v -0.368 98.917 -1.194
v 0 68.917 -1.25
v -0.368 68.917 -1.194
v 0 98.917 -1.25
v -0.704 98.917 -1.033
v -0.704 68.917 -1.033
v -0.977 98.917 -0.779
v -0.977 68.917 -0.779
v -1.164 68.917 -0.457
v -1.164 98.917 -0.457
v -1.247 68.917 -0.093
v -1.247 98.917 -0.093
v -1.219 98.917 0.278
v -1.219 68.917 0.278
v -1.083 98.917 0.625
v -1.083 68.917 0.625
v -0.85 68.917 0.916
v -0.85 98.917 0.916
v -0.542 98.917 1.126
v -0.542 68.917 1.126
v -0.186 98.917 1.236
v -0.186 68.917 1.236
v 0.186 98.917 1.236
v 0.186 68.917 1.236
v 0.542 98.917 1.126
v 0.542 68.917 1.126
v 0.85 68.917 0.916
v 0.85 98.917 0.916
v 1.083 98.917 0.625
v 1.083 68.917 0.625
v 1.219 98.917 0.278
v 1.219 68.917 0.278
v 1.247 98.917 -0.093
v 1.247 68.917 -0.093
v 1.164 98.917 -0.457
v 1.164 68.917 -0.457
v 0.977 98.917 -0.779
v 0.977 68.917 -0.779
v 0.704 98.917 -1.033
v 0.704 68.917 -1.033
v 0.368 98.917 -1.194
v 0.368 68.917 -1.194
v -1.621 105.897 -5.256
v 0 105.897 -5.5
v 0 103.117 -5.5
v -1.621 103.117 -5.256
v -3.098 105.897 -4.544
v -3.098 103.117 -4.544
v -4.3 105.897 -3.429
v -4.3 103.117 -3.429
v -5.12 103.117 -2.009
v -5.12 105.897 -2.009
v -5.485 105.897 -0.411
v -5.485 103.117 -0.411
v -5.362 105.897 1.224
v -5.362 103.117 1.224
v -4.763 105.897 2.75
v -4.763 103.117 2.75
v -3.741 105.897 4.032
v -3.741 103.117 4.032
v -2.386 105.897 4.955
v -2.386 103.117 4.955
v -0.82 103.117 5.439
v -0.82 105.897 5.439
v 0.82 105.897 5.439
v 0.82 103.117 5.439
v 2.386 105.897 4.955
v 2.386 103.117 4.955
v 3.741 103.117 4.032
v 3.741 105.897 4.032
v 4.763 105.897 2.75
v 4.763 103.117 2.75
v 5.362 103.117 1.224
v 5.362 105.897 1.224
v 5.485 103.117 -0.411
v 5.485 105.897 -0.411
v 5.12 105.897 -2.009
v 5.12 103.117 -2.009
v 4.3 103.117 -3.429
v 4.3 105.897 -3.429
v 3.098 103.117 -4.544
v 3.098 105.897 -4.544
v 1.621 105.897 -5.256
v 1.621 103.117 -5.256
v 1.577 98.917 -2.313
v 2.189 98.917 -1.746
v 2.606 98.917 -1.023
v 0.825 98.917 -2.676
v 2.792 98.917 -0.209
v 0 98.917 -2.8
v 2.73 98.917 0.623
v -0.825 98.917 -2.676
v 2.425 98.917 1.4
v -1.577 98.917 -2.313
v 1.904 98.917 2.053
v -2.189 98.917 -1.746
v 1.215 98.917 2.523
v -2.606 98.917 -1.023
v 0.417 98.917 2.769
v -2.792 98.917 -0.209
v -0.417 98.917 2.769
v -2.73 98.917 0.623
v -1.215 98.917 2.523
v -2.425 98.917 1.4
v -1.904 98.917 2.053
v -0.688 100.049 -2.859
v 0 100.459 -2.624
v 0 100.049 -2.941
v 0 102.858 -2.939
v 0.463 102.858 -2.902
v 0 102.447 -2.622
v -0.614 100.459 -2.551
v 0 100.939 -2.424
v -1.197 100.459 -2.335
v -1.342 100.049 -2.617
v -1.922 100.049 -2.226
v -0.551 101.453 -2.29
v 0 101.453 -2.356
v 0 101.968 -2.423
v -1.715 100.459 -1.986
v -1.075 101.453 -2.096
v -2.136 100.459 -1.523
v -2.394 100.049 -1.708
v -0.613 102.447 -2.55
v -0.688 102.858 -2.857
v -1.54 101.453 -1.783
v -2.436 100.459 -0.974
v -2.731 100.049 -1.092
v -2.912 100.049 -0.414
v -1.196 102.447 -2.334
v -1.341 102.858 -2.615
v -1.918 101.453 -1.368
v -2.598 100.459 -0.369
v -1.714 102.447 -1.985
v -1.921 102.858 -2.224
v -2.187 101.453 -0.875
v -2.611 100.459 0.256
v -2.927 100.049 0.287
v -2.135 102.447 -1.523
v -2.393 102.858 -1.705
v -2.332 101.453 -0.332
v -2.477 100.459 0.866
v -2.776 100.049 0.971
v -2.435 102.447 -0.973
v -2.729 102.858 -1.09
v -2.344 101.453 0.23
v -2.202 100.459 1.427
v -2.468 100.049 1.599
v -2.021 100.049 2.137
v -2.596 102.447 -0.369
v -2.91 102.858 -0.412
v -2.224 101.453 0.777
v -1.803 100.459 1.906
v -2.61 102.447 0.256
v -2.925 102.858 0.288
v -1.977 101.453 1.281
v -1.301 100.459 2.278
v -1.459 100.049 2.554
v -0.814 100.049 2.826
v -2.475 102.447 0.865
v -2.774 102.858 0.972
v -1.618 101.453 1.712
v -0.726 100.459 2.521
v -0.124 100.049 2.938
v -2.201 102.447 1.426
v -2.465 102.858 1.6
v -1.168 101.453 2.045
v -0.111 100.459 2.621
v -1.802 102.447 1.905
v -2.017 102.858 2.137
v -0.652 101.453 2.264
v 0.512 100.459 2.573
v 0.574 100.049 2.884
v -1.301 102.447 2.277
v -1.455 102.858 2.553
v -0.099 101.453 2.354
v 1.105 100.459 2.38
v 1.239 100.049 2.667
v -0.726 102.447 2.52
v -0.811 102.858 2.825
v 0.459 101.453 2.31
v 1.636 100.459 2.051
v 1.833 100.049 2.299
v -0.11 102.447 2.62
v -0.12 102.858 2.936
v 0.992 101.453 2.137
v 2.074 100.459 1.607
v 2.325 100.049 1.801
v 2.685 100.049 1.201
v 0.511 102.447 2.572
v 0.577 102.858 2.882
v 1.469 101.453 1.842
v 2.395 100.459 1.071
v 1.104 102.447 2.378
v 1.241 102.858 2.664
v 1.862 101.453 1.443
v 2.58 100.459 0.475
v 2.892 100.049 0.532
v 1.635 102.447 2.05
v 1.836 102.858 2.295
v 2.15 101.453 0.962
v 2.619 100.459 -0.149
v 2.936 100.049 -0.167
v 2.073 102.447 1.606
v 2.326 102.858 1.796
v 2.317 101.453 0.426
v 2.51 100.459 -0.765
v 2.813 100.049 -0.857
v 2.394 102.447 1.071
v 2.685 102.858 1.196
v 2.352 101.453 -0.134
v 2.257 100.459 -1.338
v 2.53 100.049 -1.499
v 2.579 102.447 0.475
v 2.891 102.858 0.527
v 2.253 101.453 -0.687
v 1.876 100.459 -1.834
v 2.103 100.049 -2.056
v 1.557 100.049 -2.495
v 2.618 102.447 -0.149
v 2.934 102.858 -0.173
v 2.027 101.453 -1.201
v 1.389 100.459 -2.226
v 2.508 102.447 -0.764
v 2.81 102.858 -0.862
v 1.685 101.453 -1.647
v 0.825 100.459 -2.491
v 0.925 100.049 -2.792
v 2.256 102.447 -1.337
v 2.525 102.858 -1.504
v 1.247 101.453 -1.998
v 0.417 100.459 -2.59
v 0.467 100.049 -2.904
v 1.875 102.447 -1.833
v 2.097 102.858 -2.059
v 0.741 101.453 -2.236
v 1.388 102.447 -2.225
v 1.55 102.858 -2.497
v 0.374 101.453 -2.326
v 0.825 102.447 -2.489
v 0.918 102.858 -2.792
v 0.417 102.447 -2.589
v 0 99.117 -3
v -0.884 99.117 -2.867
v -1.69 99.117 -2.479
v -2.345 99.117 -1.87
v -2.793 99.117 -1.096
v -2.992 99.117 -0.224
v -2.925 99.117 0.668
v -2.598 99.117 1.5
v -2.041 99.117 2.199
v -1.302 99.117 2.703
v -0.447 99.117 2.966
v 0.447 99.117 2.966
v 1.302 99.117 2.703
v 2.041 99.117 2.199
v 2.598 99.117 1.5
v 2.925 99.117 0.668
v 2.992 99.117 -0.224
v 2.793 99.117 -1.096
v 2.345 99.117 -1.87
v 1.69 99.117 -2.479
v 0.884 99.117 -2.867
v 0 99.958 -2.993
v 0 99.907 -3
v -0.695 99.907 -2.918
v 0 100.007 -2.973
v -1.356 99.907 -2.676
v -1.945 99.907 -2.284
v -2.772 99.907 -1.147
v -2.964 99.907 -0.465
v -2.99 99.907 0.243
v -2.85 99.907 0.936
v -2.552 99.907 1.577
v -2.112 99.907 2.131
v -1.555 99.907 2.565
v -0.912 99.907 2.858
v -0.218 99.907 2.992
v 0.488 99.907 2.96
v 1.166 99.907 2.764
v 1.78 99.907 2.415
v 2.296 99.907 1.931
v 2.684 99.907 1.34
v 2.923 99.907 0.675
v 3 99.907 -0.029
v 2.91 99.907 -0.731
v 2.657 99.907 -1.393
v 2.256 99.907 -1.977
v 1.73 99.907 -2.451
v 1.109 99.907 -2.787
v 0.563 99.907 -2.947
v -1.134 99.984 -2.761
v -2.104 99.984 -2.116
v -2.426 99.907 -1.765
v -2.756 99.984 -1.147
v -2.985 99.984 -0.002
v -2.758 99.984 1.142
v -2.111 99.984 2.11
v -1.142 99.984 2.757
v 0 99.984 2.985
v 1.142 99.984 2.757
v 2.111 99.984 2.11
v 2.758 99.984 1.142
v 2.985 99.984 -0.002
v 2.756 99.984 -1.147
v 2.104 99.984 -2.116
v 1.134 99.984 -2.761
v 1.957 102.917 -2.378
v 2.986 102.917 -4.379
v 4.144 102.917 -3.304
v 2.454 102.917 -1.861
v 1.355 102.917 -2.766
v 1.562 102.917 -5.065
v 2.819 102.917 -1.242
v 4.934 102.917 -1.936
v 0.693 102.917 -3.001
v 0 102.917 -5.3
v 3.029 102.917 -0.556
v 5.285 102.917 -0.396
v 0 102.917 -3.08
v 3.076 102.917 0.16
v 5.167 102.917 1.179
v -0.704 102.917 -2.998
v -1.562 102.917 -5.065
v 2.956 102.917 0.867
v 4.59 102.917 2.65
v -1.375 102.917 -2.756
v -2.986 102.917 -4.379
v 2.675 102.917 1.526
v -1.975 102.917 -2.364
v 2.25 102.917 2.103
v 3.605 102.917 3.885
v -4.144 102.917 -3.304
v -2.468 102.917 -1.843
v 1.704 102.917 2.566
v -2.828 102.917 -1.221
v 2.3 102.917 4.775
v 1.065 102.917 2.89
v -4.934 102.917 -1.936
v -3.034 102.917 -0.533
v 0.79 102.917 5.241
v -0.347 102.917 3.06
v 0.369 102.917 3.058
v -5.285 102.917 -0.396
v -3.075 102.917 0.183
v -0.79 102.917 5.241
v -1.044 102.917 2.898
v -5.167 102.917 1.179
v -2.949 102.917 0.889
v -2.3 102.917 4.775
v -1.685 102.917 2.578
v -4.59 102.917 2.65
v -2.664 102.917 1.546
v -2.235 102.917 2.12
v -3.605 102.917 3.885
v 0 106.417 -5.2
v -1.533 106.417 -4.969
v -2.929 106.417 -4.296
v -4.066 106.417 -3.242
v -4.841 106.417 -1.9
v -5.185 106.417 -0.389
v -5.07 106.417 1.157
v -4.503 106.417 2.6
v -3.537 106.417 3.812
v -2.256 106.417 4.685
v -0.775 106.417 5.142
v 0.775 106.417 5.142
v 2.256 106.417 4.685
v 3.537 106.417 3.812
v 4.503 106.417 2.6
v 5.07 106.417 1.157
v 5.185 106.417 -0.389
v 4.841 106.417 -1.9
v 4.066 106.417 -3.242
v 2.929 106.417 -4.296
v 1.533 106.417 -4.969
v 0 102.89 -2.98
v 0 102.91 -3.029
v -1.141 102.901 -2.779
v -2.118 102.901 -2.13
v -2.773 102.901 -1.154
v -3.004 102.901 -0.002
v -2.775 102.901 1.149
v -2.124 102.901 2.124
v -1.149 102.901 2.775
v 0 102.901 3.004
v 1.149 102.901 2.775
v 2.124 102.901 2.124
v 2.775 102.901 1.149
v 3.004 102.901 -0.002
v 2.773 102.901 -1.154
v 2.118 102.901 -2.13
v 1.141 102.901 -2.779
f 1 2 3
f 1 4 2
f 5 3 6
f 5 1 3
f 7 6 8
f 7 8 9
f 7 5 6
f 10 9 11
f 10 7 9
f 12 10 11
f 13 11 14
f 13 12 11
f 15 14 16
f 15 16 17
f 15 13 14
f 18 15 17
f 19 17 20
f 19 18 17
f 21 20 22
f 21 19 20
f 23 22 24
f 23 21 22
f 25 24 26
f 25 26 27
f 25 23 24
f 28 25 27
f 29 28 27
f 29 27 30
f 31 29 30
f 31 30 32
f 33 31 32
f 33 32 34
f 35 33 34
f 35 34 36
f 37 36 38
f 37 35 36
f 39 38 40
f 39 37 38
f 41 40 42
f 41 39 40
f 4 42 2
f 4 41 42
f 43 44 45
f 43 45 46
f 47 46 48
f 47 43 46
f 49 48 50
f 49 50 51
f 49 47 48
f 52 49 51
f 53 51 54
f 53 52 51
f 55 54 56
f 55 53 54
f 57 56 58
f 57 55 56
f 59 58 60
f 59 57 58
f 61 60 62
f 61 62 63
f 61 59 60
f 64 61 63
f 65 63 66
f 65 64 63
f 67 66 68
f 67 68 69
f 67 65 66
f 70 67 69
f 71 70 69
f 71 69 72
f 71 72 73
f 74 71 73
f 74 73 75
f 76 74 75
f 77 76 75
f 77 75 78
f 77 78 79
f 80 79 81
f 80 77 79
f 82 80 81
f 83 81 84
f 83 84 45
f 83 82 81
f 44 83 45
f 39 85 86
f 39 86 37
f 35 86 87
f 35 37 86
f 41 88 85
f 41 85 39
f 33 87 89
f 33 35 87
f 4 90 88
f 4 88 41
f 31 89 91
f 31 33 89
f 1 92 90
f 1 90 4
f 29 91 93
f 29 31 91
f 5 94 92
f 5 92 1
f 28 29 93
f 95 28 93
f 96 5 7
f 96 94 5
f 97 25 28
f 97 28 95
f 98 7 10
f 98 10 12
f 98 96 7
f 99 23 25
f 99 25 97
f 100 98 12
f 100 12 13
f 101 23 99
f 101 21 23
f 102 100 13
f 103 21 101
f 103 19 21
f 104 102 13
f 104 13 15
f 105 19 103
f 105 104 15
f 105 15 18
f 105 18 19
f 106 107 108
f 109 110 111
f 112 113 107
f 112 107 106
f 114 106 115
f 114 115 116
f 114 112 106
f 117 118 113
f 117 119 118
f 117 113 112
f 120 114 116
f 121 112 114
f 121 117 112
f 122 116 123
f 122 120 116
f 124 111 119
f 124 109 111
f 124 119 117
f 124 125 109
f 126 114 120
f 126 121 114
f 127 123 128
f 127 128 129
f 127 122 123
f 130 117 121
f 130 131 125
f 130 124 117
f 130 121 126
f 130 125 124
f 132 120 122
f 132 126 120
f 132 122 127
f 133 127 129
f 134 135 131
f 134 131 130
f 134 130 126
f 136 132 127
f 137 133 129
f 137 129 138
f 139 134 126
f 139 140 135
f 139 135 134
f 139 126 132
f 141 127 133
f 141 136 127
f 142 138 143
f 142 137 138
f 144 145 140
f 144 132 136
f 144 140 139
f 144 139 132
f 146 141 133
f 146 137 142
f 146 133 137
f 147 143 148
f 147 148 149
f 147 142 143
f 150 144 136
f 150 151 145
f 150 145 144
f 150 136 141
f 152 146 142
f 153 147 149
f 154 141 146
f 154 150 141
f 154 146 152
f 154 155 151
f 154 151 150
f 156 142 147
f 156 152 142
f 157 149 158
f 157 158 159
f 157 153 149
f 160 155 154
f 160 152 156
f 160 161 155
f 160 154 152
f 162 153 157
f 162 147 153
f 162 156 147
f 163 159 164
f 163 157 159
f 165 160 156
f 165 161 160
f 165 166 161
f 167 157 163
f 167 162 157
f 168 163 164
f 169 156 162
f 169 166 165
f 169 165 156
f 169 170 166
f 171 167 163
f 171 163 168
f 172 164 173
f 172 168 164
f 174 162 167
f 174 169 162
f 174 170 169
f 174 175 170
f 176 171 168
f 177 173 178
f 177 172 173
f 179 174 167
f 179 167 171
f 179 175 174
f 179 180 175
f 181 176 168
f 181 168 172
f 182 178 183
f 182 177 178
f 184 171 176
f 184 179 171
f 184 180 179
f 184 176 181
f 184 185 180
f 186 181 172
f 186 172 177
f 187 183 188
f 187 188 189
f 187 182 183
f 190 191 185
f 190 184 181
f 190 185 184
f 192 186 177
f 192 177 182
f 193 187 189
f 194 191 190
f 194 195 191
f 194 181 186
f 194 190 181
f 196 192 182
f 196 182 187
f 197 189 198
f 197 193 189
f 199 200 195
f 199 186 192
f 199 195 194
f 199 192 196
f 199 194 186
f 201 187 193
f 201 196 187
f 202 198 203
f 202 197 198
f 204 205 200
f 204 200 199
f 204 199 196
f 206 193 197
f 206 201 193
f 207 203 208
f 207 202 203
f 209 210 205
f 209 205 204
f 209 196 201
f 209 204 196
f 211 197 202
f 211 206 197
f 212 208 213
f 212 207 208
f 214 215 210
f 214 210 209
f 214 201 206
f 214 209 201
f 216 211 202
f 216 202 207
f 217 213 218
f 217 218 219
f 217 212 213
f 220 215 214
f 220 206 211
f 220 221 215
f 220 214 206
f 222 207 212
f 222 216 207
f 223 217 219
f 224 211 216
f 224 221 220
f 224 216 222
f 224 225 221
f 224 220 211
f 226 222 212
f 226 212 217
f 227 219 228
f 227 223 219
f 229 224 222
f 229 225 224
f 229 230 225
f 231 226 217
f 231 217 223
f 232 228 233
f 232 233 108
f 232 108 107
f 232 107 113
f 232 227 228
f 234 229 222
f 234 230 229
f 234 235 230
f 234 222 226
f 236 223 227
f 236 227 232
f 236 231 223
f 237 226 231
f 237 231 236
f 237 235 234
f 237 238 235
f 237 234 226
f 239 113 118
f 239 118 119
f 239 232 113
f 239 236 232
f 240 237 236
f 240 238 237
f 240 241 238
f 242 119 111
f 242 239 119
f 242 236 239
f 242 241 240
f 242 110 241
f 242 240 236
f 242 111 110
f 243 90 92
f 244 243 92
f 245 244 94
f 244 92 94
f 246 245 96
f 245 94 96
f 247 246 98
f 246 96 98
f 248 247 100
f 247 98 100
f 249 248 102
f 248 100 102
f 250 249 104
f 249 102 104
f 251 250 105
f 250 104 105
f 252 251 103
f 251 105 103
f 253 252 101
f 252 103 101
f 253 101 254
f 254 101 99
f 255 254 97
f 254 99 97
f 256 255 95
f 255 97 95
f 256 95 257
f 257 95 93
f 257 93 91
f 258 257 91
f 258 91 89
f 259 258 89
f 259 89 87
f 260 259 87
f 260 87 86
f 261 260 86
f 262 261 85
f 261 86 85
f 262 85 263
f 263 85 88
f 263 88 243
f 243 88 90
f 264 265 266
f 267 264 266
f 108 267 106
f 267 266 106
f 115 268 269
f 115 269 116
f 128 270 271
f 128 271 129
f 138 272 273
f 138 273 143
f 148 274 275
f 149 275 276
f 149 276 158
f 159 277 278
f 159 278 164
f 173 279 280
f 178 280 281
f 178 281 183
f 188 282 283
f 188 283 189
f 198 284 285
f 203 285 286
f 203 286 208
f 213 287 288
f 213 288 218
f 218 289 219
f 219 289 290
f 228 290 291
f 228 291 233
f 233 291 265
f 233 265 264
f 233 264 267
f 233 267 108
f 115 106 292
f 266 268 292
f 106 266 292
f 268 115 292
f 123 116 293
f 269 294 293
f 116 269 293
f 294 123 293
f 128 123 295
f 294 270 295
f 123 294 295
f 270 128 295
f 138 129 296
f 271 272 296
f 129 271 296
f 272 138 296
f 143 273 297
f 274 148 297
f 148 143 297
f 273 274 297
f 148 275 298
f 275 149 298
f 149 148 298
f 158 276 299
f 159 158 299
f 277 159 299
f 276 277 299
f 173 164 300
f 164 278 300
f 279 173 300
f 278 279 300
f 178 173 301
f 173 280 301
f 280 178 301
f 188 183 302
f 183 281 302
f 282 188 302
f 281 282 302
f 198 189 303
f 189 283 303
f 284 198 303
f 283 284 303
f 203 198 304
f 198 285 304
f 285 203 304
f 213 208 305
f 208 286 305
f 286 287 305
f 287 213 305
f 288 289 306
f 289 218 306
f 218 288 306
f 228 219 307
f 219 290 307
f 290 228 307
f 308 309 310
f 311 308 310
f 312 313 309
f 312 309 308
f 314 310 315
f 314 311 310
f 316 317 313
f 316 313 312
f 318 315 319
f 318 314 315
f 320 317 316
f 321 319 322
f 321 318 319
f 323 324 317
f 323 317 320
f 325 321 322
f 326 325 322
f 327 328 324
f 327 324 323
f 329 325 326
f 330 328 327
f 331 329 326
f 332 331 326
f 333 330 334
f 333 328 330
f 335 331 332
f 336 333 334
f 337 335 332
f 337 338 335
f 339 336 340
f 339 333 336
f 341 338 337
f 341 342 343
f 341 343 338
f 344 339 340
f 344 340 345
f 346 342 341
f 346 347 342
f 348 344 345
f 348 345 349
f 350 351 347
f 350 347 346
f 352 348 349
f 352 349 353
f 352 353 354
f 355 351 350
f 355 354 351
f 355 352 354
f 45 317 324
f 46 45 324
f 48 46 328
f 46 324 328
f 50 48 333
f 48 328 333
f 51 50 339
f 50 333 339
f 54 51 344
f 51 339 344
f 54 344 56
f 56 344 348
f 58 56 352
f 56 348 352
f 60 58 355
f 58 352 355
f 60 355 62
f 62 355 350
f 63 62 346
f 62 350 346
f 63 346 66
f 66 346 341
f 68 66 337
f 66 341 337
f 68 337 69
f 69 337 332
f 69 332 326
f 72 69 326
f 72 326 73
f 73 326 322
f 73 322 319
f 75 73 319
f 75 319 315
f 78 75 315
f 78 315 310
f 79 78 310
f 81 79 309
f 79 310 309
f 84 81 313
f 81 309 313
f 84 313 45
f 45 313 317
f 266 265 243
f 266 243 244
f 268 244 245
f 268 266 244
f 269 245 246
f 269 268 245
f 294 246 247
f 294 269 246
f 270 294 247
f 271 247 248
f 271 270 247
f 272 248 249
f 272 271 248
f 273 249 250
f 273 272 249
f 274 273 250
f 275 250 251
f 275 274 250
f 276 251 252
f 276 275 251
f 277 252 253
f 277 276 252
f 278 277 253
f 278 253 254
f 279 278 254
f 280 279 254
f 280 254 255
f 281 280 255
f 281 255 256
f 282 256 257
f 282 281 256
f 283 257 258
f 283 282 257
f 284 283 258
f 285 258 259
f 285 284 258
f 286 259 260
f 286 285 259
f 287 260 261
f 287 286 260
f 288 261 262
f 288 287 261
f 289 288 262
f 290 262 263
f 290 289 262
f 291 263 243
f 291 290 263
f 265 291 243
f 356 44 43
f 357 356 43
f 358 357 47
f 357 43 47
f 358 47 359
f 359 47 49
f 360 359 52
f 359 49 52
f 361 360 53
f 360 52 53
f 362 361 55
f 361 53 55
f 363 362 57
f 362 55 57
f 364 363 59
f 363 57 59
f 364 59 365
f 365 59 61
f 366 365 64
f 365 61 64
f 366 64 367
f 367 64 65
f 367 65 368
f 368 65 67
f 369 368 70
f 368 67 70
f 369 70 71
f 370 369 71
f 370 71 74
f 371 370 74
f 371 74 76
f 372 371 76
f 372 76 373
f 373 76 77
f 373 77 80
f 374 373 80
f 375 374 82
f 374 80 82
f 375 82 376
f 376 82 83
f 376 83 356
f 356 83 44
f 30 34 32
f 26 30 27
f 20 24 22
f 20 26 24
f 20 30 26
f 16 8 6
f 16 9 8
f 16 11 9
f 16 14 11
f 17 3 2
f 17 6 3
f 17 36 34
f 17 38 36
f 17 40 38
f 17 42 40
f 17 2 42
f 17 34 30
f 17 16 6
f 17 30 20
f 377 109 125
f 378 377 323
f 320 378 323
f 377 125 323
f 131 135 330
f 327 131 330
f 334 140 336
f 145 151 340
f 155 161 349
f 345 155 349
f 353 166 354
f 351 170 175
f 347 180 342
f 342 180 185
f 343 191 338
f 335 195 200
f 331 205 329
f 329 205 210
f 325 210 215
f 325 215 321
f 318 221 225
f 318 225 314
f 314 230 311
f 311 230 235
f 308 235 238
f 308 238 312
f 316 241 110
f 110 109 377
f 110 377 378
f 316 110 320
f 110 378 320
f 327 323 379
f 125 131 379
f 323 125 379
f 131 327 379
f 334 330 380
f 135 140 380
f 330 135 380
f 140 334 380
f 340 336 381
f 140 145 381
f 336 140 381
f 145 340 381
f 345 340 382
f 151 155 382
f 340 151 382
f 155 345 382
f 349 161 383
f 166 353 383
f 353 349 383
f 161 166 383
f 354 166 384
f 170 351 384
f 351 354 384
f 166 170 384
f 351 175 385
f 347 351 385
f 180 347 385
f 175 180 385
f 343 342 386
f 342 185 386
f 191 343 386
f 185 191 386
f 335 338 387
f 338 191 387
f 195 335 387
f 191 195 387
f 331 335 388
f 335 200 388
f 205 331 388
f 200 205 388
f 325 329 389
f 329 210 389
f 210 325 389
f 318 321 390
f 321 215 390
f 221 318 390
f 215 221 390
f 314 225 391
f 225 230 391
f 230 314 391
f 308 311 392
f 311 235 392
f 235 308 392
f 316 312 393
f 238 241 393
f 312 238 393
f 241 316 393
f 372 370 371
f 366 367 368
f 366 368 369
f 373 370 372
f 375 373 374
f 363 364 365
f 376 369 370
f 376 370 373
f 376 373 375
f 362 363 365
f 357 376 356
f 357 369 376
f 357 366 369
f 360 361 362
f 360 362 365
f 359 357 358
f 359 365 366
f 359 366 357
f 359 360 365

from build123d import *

# Parameters (mm, degrees)
SKETCH1_W      = 12.5
SKETCH1_H      = 300
CHAMFER1_SIZE  = 3
CHAMFER1_SIZE2 = 5.196152423
CHAMFER2_SIZE  = 2
CHAMFER3_SIZE  = 2
FILLET1_R      = 2
FILLET2_R      = 2
SCALE1_SCALE   = 0.1


with BuildPart() as part:
    # Sketch1 → Revolve1 (revolve)
    with BuildSketch(Plane.XY, mode=Mode.PRIVATE) as revolve1_sk:
        with Locations((6.25, -48.713790357)):
            Rectangle(SKETCH1_W, SKETCH1_H)
    revolve(revolve1_sk.sketch.rotate(Axis((0, 0, 0), (0, 1, 0)), 90), axis=Axis((0, 0, 0), (0, 1, 0)))

    # Sketch2 → Revolve2 (revolve)
    with BuildSketch(Plane.XY, mode=Mode.PRIVATE) as revolve2_sk:
        with BuildLine():
            Line((0, 101.286209643), (12.5, 101.286209643))
            Line((12.5, 101.286209643), (30, 101.286209643))
            Line((30, 101.286209643), (30, 112.044433041))
            ThreePointArc((30, 112.044433041), (23.556624576, 126.665321342), (30, 141.286209643))
            Line((30, 141.286209643), (55, 141.286209643))
            Line((55, 141.286209643), (55, 176.286209643))
            Line((55, 176.286209643), (0, 176.286209643))
            Line((0, 176.286209643), (0, 101.286209643))
        make_face()
    revolve(revolve2_sk.sketch.rotate(Axis((0, 0, 0), (0, 1, 0)), 90), axis=Axis((0, 0, 0), (0, 1, 0)))

    # Chamfer1
    chamfer1_edges = [part.edges().sort_by_distance(p)[0] for p in [
        (0, 176.286209643, 55),
    ]]
    chamfer1_side = [part.faces().sort_by_distance(p)[0] for p in [
        (0, 176.286209643, 0),
    ]]
    chamfer(chamfer1_edges, length=CHAMFER1_SIZE, length2=CHAMFER1_SIZE2, reference=chamfer1_side[0])

    # Chamfer2
    chamfer2_edges = [part.edges().sort_by_distance(p)[0] for p in [
        (0, 141.286209643, 55),
    ]]
    chamfer(chamfer2_edges, length=CHAMFER2_SIZE)

    # Chamfer3
    chamfer3_edges = [part.edges().sort_by_distance(p)[0] for p in [
        (0, 101.286209643, 30),
    ]]
    chamfer(chamfer3_edges, length=CHAMFER3_SIZE)

    # Fillet1
    fillet1_edges = [part.edges().sort_by_distance(p)[0] for p in [
        (0, 112.044433041, 30),
    ]]
    fillet(fillet1_edges, radius=FILLET1_R)

    # Fillet2
    fillet2_edges = [part.edges().sort_by_distance(p)[0] for p in [
        (0, 141.286209643, 30),
    ]]
    fillet(fillet2_edges, radius=FILLET2_R)


with BuildPart() as part_1:
    # Scale1: scaled about (0, 98.653209901, -1.6e-08)
    add(part.part.scale(SCALE1_SCALE).moved(Location((0, 88.787888911, -1.4e-08))))


solid = part_1.part
